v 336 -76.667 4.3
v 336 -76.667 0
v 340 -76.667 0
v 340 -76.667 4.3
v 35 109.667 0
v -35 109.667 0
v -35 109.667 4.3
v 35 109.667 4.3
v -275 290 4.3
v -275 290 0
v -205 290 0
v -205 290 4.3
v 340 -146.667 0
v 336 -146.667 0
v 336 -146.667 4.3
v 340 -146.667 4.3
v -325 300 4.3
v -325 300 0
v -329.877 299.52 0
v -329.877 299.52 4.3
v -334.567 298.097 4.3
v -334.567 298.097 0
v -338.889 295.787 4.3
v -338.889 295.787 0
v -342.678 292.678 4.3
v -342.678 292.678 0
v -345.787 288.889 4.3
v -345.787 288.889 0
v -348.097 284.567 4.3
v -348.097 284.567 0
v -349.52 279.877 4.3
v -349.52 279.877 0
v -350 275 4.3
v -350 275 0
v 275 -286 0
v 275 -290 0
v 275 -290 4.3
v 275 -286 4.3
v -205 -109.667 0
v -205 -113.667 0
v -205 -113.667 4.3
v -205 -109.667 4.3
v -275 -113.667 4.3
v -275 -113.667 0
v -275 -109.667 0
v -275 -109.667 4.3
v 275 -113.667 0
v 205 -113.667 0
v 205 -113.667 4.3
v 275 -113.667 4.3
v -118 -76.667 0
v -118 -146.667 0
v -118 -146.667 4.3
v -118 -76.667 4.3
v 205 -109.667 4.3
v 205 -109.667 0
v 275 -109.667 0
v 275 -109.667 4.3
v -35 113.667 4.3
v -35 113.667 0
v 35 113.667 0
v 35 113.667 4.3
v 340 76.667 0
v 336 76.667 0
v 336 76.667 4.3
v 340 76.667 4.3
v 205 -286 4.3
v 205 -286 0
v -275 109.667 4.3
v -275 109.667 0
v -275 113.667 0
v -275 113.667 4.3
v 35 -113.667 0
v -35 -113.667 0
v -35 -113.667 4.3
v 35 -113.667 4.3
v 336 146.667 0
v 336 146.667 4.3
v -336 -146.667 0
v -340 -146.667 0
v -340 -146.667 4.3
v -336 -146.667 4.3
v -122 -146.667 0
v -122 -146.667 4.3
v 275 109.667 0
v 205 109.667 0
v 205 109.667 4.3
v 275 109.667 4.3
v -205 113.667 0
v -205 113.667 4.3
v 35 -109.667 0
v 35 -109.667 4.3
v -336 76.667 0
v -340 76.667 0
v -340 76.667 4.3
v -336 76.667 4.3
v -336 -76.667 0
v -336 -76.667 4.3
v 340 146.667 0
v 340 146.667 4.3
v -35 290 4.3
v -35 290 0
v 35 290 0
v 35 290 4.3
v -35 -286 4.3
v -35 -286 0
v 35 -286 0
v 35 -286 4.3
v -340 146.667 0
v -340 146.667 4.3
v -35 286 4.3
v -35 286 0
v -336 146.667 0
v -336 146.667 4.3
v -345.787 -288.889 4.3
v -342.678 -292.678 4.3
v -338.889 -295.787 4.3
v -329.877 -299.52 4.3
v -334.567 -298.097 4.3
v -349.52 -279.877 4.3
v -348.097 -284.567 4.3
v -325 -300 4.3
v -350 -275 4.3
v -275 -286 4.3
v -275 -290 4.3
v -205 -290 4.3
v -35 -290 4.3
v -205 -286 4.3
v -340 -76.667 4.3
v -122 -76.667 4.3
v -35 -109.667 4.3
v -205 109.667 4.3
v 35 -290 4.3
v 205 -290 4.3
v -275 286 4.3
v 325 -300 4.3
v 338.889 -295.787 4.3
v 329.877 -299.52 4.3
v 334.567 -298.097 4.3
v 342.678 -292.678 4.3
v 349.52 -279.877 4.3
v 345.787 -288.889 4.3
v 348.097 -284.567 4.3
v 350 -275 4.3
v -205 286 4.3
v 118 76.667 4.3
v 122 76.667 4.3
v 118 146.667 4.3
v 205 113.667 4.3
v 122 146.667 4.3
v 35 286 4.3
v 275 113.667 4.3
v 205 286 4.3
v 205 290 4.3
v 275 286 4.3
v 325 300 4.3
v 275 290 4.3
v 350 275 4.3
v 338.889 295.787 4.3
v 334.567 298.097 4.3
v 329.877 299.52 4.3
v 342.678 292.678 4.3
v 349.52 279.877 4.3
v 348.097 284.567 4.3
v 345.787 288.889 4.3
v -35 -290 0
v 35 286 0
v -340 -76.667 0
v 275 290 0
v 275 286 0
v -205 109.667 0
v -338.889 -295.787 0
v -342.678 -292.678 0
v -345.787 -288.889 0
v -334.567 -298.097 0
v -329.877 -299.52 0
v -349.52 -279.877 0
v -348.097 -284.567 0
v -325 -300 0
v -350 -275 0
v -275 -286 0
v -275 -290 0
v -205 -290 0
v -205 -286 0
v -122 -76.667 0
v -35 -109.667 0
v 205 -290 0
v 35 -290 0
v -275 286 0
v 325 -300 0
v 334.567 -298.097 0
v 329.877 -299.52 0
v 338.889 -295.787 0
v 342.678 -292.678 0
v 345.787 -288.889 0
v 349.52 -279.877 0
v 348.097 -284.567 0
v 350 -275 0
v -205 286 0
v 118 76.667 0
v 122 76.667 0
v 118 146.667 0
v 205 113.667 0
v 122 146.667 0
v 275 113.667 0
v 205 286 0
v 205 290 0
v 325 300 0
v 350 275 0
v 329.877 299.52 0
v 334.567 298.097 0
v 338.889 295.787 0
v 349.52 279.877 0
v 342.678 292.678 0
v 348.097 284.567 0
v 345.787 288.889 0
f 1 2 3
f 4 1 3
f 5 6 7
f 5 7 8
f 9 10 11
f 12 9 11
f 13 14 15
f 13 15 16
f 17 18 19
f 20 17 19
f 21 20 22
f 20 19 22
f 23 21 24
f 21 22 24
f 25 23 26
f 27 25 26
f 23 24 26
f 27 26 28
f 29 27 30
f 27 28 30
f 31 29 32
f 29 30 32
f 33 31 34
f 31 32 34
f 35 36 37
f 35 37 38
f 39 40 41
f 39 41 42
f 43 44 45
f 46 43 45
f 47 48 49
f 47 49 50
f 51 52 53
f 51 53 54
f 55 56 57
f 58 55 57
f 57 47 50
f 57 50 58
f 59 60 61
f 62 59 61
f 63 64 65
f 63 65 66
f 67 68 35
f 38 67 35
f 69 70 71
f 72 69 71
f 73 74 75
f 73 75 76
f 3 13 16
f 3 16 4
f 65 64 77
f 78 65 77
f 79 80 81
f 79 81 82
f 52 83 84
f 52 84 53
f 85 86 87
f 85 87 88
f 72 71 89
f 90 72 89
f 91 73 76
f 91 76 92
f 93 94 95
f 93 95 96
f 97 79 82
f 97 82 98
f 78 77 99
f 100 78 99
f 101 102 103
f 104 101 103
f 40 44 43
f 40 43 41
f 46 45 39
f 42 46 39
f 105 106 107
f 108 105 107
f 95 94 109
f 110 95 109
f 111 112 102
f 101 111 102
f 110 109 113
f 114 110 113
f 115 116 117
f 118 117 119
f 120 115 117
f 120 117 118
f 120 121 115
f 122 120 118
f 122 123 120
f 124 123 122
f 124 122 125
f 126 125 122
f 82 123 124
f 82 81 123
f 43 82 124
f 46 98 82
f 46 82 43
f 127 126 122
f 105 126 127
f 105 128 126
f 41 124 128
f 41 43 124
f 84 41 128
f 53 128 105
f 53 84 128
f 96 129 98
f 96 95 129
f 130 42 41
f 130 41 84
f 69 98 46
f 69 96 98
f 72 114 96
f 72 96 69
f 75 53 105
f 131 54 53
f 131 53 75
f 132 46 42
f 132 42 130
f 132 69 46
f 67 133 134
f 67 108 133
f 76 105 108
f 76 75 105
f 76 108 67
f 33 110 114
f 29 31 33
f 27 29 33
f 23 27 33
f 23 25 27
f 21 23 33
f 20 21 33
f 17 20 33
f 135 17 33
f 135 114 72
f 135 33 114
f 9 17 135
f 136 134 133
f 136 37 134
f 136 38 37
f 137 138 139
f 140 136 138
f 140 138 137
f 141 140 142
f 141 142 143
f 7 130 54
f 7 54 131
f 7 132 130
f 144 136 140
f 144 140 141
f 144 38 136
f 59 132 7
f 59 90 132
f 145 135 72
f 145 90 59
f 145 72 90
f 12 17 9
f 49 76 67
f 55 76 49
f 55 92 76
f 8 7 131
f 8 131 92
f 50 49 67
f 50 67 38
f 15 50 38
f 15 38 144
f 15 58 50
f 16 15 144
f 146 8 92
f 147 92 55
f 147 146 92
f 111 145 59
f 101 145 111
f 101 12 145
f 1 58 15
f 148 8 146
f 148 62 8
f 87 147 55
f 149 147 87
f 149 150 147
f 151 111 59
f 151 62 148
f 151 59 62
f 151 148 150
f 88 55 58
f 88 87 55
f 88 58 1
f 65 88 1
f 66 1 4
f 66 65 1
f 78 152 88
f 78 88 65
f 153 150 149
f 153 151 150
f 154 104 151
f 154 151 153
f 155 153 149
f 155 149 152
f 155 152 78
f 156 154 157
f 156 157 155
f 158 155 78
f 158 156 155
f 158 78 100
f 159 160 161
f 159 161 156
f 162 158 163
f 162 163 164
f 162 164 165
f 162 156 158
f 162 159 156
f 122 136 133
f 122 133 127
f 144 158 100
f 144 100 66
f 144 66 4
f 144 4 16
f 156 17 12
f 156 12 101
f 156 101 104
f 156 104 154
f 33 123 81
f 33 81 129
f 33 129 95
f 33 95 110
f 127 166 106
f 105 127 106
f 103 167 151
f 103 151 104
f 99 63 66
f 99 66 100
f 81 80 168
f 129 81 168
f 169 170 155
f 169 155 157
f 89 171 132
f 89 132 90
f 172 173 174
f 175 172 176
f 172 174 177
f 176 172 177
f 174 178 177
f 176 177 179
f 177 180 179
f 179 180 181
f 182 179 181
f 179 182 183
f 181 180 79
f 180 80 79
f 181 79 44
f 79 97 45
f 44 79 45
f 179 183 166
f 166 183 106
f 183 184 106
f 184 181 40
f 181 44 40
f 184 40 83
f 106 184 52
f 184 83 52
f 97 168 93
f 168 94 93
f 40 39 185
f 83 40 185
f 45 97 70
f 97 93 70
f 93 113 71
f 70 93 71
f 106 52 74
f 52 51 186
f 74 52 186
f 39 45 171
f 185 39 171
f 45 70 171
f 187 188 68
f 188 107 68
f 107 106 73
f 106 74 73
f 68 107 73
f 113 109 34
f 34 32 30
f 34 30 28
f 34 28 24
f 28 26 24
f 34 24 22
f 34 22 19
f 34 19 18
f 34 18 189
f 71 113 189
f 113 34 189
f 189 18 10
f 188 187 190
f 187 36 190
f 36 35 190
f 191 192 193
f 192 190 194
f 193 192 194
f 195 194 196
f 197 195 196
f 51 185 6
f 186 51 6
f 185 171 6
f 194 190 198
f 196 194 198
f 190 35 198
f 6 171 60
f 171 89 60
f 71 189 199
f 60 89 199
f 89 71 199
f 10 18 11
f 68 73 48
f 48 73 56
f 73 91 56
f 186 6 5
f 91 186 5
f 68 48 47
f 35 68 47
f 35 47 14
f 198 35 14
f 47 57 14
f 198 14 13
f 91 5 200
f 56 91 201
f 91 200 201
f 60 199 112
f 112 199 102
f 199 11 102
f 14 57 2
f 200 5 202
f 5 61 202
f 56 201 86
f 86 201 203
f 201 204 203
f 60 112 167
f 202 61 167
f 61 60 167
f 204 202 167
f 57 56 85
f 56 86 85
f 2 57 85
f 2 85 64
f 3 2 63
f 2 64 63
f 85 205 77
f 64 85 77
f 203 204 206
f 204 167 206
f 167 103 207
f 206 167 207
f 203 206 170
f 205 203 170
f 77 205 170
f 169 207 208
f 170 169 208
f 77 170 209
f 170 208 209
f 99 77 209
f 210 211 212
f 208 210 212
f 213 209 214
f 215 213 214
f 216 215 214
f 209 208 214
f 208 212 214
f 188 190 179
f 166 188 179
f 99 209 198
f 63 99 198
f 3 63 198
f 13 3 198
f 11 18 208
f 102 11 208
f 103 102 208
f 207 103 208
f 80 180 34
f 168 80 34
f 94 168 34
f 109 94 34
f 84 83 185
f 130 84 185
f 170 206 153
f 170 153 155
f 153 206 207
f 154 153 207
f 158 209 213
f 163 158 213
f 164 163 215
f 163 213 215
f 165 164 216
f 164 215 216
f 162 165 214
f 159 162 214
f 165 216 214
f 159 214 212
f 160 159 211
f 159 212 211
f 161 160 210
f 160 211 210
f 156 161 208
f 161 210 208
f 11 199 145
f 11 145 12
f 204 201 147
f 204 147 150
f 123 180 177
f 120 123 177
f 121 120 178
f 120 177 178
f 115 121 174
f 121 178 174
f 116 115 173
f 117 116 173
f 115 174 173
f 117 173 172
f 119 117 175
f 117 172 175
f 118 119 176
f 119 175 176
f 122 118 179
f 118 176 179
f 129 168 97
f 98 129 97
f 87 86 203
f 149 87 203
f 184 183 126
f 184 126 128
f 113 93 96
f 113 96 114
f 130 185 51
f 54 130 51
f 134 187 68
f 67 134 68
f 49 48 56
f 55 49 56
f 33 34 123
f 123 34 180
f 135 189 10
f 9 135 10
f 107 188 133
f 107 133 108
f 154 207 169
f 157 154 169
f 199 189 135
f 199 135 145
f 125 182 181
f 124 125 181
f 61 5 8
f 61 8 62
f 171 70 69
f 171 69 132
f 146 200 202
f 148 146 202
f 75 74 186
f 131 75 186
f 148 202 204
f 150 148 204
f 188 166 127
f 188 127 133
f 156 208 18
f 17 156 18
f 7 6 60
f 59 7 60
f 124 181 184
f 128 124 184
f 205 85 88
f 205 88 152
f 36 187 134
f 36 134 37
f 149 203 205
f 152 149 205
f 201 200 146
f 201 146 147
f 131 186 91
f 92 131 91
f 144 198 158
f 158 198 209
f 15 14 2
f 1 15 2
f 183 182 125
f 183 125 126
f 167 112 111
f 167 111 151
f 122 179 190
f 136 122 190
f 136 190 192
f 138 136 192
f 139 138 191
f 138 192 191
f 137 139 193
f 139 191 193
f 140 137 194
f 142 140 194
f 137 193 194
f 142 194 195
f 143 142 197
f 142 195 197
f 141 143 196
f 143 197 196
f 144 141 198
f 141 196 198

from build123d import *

# Parameters (mm, degrees)
SKETCH1_W           = 70
SKETCH1_H           = 4
SKETCH1_W_2         = 4
SKETCH1_H_2         = 70
BOSS_EXTRUDE1_DEPTH = 4.3


with BuildPart() as part:
    # Sketch1 → Boss-Extrude1 (new body)
    with BuildSketch(Plane.XY):
        with BuildLine():
            Line((-325, -300), (325, -300))
            ThreePointArc((325, -300), (342.67766953, -292.67766953), (350, -275))
            Line((350, -275), (350, 275))
            ThreePointArc((350, 275), (342.67766953, 292.67766953), (325, 300))
            Line((325, 300), (-325, 300))
            ThreePointArc((-325, 300), (-342.67766953, 292.67766953), (-350, 275))
            Line((-350, 275), (-350, -275))
            ThreePointArc((-350, -275), (-342.67766953, -292.67766953), (-325, -300))
        make_face()
        with Locations((-240, -288)):
            Rectangle(SKETCH1_W, SKETCH1_H, mode=Mode.SUBTRACT)
        with Locations((338, -111.6666)):
            Rectangle(SKETCH1_W_2, SKETCH1_H_2, mode=Mode.SUBTRACT)
        with Locations((338, 111.6667)):
            Rectangle(SKETCH1_W_2, SKETCH1_H_2, mode=Mode.SUBTRACT)
        with Locations((0, -288)):
            Rectangle(SKETCH1_W, SKETCH1_H, mode=Mode.SUBTRACT)
        with Locations((240, -288)):
            Rectangle(SKETCH1_W, SKETCH1_H, mode=Mode.SUBTRACT)
        with Locations((-338, 111.6667)):
            Rectangle(SKETCH1_W_2, SKETCH1_H_2, mode=Mode.SUBTRACT)
        with Locations((-338, -111.6666)):
            Rectangle(SKETCH1_W_2, SKETCH1_H_2, mode=Mode.SUBTRACT)
        with Locations((120, 111.6667)):
            Rectangle(SKETCH1_W_2, SKETCH1_H_2, mode=Mode.SUBTRACT)
        with Locations((-120, -111.6667)):
            Rectangle(SKETCH1_W_2, SKETCH1_H_2, mode=Mode.SUBTRACT)
        with Locations((0, 111.6667)):
            Rectangle(SKETCH1_W, SKETCH1_H, mode=Mode.SUBTRACT)
        with Locations((-240, 111.6667)):
            Rectangle(SKETCH1_W, SKETCH1_H, mode=Mode.SUBTRACT)
        with Locations((240, 111.6667)):
            Rectangle(SKETCH1_W, SKETCH1_H, mode=Mode.SUBTRACT)
        with Locations((-240, -111.6667)):
            Rectangle(SKETCH1_W, SKETCH1_H, mode=Mode.SUBTRACT)
        with Locations((0, -111.6667)):
            Rectangle(SKETCH1_W, SKETCH1_H, mode=Mode.SUBTRACT)
        with Locations((240, -111.6667)):
            Rectangle(SKETCH1_W, SKETCH1_H, mode=Mode.SUBTRACT)
        with Locations((-240, 288)):
            Rectangle(SKETCH1_W, SKETCH1_H, mode=Mode.SUBTRACT)
        with Locations((0, 288)):
            Rectangle(SKETCH1_W, SKETCH1_H, mode=Mode.SUBTRACT)
        with Locations((240, 288)):
            Rectangle(SKETCH1_W, SKETCH1_H, mode=Mode.SUBTRACT)
    extrude(amount=BOSS_EXTRUDE1_DEPTH)


solid = part.part
